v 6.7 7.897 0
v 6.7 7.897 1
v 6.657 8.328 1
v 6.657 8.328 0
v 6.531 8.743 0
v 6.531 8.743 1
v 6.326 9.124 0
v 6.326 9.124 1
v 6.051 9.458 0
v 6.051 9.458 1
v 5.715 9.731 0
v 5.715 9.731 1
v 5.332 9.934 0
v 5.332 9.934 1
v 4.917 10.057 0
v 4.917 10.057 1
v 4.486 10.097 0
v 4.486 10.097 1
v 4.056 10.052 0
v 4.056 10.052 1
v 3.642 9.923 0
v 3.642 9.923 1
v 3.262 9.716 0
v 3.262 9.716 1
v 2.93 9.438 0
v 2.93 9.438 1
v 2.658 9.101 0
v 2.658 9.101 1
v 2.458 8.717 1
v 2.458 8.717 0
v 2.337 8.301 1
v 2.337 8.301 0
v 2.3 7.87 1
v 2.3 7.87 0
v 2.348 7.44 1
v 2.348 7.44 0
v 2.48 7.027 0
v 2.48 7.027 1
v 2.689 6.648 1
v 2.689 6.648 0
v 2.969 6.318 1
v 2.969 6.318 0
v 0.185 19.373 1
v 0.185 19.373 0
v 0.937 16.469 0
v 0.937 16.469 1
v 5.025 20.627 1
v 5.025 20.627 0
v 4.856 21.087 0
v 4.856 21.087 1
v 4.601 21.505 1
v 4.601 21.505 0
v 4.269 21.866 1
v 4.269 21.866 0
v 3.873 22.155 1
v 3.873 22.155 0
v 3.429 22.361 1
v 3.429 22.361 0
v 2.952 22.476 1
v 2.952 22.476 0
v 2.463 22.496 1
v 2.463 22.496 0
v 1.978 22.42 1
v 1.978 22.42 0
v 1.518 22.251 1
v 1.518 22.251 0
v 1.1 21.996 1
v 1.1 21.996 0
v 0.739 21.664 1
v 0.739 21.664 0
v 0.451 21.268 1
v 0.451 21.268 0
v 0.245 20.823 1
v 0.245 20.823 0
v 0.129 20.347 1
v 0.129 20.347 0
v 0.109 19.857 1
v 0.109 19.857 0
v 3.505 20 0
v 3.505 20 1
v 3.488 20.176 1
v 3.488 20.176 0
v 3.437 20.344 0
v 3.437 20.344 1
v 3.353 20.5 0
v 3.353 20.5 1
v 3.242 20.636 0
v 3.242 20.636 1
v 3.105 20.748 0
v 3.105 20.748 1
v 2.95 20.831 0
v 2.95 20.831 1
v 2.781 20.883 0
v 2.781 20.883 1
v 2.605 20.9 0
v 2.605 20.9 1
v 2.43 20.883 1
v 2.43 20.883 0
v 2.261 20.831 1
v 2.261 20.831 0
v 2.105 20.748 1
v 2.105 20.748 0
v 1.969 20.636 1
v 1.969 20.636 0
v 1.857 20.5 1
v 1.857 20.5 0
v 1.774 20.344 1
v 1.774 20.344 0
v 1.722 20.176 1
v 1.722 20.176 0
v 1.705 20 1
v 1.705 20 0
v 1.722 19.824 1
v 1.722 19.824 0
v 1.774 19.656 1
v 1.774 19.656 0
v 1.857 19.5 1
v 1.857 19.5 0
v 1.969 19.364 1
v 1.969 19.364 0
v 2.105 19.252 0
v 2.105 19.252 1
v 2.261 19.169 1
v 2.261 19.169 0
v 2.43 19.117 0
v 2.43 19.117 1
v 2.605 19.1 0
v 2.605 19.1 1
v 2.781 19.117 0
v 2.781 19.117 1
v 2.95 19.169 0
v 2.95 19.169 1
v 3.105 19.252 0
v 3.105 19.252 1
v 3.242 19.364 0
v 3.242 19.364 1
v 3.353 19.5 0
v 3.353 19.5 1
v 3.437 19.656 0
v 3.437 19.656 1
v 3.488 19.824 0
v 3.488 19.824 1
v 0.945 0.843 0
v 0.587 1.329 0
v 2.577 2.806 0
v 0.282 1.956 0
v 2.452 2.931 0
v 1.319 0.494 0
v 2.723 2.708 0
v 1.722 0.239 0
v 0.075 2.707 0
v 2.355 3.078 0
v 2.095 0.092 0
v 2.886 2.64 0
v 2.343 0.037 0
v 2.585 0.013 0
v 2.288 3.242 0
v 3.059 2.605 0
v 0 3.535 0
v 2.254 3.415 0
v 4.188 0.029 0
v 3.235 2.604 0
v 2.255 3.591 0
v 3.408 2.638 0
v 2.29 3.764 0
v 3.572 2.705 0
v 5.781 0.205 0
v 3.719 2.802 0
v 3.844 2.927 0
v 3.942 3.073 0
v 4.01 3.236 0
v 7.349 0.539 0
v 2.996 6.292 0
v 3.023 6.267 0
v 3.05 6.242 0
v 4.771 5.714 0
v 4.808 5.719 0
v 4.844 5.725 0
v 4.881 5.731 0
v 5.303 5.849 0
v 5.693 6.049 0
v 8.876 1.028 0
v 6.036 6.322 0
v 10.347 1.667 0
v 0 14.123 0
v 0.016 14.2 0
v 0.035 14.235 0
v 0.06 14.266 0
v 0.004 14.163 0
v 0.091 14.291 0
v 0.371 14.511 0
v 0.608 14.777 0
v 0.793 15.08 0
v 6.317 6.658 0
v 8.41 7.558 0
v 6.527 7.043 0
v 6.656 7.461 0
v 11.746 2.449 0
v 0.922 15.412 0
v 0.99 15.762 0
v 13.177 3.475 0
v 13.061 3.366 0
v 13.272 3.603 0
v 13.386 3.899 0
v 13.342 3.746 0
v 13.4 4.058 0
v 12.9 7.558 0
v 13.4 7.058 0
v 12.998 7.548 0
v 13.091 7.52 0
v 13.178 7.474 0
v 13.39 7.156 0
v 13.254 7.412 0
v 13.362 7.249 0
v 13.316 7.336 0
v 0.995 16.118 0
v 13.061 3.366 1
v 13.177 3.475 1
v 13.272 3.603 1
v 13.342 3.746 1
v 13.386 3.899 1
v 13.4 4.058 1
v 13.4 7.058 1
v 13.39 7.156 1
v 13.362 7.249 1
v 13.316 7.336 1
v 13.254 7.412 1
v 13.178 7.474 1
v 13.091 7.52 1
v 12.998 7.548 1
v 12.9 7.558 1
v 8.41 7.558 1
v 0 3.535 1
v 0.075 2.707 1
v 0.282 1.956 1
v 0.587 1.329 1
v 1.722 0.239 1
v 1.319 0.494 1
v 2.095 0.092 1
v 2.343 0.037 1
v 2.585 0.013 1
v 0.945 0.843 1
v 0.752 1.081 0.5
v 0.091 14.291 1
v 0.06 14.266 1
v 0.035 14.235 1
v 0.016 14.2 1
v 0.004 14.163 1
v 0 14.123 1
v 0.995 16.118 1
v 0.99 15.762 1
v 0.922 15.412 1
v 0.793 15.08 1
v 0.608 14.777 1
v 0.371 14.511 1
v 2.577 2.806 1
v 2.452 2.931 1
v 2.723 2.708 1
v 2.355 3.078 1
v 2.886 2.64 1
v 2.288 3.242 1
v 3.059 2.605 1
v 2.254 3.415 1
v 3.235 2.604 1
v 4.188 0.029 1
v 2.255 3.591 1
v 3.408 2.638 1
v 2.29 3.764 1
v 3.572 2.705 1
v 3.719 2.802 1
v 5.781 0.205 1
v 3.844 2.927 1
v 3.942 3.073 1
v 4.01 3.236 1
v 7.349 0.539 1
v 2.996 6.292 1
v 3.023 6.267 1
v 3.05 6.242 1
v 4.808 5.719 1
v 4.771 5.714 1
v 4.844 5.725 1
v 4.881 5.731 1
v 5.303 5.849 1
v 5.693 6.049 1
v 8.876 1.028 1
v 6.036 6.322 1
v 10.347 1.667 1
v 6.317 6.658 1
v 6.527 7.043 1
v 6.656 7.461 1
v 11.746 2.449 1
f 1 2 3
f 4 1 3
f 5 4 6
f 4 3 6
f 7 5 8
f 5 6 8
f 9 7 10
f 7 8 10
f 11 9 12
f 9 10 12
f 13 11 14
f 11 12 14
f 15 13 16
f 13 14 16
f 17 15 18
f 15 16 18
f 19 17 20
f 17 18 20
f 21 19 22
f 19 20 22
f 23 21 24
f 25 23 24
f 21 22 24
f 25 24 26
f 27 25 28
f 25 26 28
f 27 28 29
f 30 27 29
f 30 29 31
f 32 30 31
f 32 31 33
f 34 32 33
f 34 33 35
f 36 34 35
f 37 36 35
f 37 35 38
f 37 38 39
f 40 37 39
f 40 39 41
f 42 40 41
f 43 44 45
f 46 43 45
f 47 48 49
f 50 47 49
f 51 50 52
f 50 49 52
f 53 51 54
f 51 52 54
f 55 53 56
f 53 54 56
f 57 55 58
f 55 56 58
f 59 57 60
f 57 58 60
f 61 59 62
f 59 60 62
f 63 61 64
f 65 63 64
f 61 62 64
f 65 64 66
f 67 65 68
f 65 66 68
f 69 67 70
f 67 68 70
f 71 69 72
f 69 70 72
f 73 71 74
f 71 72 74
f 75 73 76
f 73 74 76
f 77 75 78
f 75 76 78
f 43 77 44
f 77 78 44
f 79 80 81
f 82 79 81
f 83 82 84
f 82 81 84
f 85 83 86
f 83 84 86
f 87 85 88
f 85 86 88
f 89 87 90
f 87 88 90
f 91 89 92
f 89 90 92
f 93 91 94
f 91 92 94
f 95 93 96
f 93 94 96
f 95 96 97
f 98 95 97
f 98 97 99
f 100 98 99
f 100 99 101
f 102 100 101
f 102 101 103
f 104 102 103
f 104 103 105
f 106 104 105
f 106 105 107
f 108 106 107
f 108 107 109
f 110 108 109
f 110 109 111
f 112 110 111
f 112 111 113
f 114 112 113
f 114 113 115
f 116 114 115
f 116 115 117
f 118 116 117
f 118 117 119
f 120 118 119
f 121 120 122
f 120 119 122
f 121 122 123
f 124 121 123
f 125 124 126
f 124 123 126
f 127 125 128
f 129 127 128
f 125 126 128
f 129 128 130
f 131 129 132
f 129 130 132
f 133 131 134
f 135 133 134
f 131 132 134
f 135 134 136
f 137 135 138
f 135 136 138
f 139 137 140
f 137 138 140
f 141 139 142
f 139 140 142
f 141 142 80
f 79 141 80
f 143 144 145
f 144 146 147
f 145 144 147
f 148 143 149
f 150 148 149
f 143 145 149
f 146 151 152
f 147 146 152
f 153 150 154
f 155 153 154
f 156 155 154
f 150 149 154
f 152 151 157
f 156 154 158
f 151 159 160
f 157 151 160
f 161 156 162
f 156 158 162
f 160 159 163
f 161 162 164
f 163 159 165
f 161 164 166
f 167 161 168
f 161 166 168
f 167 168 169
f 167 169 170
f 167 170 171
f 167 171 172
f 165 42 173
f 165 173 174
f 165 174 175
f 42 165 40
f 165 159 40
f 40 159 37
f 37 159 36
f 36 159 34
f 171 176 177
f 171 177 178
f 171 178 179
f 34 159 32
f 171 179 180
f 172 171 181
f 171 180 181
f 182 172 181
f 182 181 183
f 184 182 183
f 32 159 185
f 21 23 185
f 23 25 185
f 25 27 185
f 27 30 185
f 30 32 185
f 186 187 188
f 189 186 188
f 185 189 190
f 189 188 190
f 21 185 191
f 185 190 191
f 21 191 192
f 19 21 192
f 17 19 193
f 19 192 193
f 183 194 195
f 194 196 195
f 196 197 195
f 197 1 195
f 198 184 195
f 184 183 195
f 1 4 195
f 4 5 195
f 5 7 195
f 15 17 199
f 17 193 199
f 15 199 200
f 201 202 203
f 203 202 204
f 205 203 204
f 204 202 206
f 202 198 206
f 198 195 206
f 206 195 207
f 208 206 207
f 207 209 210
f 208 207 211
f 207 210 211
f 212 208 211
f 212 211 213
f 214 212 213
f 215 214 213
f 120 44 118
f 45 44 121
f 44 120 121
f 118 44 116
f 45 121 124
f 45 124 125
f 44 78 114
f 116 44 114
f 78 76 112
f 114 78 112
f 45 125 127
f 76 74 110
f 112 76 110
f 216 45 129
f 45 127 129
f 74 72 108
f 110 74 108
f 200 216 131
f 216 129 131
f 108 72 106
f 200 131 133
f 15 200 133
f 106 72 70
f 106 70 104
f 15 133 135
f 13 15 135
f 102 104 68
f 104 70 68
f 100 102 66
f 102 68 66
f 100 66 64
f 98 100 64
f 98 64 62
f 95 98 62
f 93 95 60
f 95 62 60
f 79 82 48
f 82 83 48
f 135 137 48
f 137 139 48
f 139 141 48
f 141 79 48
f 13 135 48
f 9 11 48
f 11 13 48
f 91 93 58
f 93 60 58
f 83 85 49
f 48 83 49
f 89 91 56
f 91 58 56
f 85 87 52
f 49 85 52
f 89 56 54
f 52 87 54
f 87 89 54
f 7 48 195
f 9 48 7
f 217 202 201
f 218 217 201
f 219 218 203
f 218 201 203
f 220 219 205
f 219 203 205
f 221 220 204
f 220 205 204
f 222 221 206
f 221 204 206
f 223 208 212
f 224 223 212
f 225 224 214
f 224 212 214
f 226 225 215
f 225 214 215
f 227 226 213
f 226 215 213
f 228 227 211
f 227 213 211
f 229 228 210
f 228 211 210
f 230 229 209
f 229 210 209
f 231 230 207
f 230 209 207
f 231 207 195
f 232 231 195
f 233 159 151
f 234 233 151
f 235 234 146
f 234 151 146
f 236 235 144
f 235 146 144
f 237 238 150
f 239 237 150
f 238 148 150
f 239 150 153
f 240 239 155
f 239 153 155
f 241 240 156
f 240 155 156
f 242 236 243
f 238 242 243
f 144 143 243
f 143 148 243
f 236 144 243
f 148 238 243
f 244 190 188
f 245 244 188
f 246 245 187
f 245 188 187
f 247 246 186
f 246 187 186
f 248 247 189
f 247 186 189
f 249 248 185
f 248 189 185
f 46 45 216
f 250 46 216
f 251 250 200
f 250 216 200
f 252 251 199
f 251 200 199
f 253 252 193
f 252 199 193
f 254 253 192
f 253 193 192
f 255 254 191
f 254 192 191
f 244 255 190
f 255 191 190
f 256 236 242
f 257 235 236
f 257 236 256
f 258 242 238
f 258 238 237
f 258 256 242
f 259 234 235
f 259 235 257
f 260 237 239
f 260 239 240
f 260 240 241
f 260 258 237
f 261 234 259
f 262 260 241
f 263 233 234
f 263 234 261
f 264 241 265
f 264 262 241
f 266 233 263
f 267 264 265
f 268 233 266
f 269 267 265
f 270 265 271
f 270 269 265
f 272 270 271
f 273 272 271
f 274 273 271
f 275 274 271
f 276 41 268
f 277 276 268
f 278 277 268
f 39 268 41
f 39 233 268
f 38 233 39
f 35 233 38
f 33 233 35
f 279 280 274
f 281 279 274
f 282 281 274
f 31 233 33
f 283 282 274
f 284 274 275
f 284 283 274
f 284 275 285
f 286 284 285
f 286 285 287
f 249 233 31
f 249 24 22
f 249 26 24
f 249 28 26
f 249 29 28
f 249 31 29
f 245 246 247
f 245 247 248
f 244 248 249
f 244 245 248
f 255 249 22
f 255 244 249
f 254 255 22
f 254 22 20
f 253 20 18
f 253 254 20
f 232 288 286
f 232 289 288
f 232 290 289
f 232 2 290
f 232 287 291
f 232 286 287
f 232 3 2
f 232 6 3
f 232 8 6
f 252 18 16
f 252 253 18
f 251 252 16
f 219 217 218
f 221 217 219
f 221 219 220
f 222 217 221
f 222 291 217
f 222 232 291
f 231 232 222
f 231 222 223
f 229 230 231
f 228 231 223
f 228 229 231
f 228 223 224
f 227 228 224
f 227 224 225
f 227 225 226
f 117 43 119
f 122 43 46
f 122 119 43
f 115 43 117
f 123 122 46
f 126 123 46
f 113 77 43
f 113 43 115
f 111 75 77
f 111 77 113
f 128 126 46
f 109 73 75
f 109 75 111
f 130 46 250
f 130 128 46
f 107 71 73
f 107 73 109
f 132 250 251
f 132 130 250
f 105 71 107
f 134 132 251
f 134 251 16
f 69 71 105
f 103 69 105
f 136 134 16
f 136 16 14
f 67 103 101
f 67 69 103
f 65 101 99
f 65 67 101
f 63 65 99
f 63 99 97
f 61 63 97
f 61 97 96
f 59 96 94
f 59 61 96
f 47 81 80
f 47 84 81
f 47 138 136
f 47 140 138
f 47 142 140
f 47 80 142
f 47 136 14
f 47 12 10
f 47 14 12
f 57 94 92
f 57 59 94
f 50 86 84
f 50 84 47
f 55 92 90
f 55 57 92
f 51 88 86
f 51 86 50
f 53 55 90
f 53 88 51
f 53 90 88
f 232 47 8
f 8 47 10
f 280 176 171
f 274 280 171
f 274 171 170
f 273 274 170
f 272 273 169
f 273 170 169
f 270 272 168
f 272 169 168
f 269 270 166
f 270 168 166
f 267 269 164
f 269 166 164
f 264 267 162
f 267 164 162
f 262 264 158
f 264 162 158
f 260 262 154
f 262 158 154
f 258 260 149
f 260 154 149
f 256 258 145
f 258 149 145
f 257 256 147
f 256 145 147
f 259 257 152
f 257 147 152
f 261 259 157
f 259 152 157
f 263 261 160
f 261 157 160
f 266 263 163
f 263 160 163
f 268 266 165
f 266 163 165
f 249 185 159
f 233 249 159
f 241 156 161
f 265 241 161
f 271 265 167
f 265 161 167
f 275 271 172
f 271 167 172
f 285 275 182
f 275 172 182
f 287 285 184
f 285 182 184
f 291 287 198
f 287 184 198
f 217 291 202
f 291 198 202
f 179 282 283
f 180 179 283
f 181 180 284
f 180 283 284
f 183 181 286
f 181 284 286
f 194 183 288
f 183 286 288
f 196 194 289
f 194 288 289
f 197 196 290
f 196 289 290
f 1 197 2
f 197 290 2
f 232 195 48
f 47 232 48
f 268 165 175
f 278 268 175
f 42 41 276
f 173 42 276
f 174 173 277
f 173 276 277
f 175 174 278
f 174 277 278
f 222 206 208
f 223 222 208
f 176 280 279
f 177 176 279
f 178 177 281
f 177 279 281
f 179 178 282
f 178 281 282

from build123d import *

# Parameters (mm, degrees)
F0_R     = 0.75
F1_DEPTH = 1
F3_DEPTH = 1.0010001
F2_R     = 0.9
F2_R_2   = 0.75
F4_DEPTH = 1.0010001


with BuildPart() as f1:
    # F0 (on Top) → F1 (new body)
    with BuildSketch(Plane.XY):
        with BuildLine():
            Line((8.4099927317, 7.5580001656), (5.0252605515, 20.6268022556))
            ThreePointArc((5.0252605515, 20.6268022556), (1.9783097607, 22.4201485352), (0.1849634811, 19.3731977444))
            Line((0.1849634811, 19.3731977444), (0.9371261878, 16.4690195022))
            ThreePointArc((0.9371261878, 16.4690195022), (0.8653051518, 15.2434273388), (0.0910006691, 14.2907012605))
            ThreePointArc((0.0910006691, 14.2907012605), (0.024216232, 14.2184078876), (0, 14.1230136168))
            Line((0, 14.1230136168), (0, 3.5349456812))
            add(Edge.make_bspline(
                [(0, 3.5349456812), (0, 0.1151861329), (2.5847140193, 0.0126293901)],
                knots=[4.7123889804, 4.7123889804, 4.7123889804, 6.2531913499, 6.2531913499, 6.2531913499], degree=2, weights=[1, 0.717631333, 1]))
            ThreePointArc((2.5847140193, 0.0126293901), (8.1188853822, 0.7647703189), (13.0609901745, 3.3663792197))
            ThreePointArc((13.0609901745, 3.3663792197), (13.3106896342, 3.672880965), (13.4, 4.0580001656))
            Line((13.4, 4.0580001656), (13.4, 7.0580001656))
            ThreePointArc((13.4, 7.0580001656), (13.2535533906, 7.4115535562), (12.9, 7.5580001656))
            Line((12.9, 7.5580001656), (8.4099927317, 7.5580001656))
        make_face()
        with BuildLine():
            ThreePointArc((3.1154618928, 6.4541634531), (5.0869565217, 9.8093739335), (4.8362002383, 5.9259025835))
            Line((4.8362002383, 5.9259025835), (4.0103691728, 3.2358695652))
            ThreePointArc((4.0103691728, 3.2358695652), (2.8858695652, 2.6396308272), (2.2896308272, 3.7641304348))
            Line((2.2896308272, 3.7641304348), (3.1154618928, 6.4541634531))
        make_face(mode=Mode.SUBTRACT)
        with Locations((2.6051120163, 20)):
            Circle(F0_R, mode=Mode.SUBTRACT)
    extrude(amount=F1_DEPTH)

    # F2 (on face) → F3 (cut, through all)
    with BuildSketch(Plane.XY.offset(1)):
        with BuildLine():
            Line((3.1154618928, 6.4541634531), (3.0504773302, 6.2424850283))
            ThreePointArc((3.0504773302, 6.2424850283), (3.8543478261, 5.794317794), (4.7712156757, 5.7142241587))
            Line((4.7712156757, 5.7142241587), (4.8362002383, 5.9259025835))
            ThreePointArc((4.8362002383, 5.9259025835), (4.8920816578, 5.9362509706), (4.9476464888, 5.9481829327))
            Line((4.9476464888, 5.9481829327), (5.4559657475, 7.6039641776))
            ThreePointArc((5.4559657475, 7.6039641776), (4.2065217391, 6.941476691), (3.5440342525, 8.1909206994))
            Line((3.5440342525, 8.1909206994), (3.0357149938, 6.5351394544))
            ThreePointArc((3.0357149938, 6.5351394544), (3.0750131365, 6.4940848793), (3.1154618928, 6.4541634531))
        make_face()
        with BuildLine():
            ThreePointArc((4.8808681557, 5.7306615433), (6.1849198709, 6.4828594509), (6.7, 7.8974424385))
            ThreePointArc((6.7, 7.8974424385), (3.6421944703, 9.9233174774), (2.9689366607, 6.317618065))
            Line((2.9689366607, 6.317618065), (3.0357149938, 6.5351394544))
            ThreePointArc((3.0357149938, 6.5351394544), (5.0869565217, 9.8093739335), (4.9476464888, 5.9481829327))
            Line((4.9476464888, 5.9481829327), (4.8808681557, 5.7306615433))
        make_face()
        with BuildLine():
            ThreePointArc((4.7712156757, 5.7142241587), (4.8261454855, 5.7217519453), (4.8808681557, 5.7306615433))
            Line((4.8808681557, 5.7306615433), (4.9476464888, 5.9481829327))
            ThreePointArc((4.9476464888, 5.9481829327), (4.8920816578, 5.9362509706), (4.8362002383, 5.9259025835))
            Line((4.8362002383, 5.9259025835), (4.7712156757, 5.7142241587))
        make_face()
        with BuildLine():
            Line((3.0357149938, 6.5351394544), (2.9689366607, 6.317618065))
            ThreePointArc((2.9689366607, 6.317618065), (3.0092335922, 6.2795377697), (3.0504773302, 6.2424850283))
            Line((3.0504773302, 6.2424850283), (3.1154618928, 6.4541634531))
            ThreePointArc((3.1154618928, 6.4541634531), (3.0750131365, 6.4940848793), (3.0357149938, 6.5351394544))
        make_face()
        with BuildLine():
            ThreePointArc((4.9476464888, 5.9481829327), (5.0869565217, 9.8093739335), (3.0357149938, 6.5351394544))
            Line((3.0357149938, 6.5351394544), (3.5440342525, 8.1909206994))
            ThreePointArc((3.5440342525, 8.1909206994), (4.6483816911, 8.8863726048), (5.5, 7.8974424385))
            ThreePointArc((5.5, 7.8974424385), (5.4889301663, 7.7490607474), (5.4559657475, 7.6039641776))
            Line((5.4559657475, 7.6039641776), (4.9476464888, 5.9481829327))
        make_face()
    extrude(amount=-F3_DEPTH, mode=Mode.SUBTRACT)

    # F2 (on face) → F4 (cut, through all)
    with BuildSketch(Plane.XY.offset(1)):
        with Locations((2.6051120163, 20)):
            Circle(F2_R)
        with Locations((2.6051120163, 20)):
            Circle(F2_R_2, mode=Mode.SUBTRACT)
    extrude(amount=-F4_DEPTH, mode=Mode.SUBTRACT)


solid = f1.part
